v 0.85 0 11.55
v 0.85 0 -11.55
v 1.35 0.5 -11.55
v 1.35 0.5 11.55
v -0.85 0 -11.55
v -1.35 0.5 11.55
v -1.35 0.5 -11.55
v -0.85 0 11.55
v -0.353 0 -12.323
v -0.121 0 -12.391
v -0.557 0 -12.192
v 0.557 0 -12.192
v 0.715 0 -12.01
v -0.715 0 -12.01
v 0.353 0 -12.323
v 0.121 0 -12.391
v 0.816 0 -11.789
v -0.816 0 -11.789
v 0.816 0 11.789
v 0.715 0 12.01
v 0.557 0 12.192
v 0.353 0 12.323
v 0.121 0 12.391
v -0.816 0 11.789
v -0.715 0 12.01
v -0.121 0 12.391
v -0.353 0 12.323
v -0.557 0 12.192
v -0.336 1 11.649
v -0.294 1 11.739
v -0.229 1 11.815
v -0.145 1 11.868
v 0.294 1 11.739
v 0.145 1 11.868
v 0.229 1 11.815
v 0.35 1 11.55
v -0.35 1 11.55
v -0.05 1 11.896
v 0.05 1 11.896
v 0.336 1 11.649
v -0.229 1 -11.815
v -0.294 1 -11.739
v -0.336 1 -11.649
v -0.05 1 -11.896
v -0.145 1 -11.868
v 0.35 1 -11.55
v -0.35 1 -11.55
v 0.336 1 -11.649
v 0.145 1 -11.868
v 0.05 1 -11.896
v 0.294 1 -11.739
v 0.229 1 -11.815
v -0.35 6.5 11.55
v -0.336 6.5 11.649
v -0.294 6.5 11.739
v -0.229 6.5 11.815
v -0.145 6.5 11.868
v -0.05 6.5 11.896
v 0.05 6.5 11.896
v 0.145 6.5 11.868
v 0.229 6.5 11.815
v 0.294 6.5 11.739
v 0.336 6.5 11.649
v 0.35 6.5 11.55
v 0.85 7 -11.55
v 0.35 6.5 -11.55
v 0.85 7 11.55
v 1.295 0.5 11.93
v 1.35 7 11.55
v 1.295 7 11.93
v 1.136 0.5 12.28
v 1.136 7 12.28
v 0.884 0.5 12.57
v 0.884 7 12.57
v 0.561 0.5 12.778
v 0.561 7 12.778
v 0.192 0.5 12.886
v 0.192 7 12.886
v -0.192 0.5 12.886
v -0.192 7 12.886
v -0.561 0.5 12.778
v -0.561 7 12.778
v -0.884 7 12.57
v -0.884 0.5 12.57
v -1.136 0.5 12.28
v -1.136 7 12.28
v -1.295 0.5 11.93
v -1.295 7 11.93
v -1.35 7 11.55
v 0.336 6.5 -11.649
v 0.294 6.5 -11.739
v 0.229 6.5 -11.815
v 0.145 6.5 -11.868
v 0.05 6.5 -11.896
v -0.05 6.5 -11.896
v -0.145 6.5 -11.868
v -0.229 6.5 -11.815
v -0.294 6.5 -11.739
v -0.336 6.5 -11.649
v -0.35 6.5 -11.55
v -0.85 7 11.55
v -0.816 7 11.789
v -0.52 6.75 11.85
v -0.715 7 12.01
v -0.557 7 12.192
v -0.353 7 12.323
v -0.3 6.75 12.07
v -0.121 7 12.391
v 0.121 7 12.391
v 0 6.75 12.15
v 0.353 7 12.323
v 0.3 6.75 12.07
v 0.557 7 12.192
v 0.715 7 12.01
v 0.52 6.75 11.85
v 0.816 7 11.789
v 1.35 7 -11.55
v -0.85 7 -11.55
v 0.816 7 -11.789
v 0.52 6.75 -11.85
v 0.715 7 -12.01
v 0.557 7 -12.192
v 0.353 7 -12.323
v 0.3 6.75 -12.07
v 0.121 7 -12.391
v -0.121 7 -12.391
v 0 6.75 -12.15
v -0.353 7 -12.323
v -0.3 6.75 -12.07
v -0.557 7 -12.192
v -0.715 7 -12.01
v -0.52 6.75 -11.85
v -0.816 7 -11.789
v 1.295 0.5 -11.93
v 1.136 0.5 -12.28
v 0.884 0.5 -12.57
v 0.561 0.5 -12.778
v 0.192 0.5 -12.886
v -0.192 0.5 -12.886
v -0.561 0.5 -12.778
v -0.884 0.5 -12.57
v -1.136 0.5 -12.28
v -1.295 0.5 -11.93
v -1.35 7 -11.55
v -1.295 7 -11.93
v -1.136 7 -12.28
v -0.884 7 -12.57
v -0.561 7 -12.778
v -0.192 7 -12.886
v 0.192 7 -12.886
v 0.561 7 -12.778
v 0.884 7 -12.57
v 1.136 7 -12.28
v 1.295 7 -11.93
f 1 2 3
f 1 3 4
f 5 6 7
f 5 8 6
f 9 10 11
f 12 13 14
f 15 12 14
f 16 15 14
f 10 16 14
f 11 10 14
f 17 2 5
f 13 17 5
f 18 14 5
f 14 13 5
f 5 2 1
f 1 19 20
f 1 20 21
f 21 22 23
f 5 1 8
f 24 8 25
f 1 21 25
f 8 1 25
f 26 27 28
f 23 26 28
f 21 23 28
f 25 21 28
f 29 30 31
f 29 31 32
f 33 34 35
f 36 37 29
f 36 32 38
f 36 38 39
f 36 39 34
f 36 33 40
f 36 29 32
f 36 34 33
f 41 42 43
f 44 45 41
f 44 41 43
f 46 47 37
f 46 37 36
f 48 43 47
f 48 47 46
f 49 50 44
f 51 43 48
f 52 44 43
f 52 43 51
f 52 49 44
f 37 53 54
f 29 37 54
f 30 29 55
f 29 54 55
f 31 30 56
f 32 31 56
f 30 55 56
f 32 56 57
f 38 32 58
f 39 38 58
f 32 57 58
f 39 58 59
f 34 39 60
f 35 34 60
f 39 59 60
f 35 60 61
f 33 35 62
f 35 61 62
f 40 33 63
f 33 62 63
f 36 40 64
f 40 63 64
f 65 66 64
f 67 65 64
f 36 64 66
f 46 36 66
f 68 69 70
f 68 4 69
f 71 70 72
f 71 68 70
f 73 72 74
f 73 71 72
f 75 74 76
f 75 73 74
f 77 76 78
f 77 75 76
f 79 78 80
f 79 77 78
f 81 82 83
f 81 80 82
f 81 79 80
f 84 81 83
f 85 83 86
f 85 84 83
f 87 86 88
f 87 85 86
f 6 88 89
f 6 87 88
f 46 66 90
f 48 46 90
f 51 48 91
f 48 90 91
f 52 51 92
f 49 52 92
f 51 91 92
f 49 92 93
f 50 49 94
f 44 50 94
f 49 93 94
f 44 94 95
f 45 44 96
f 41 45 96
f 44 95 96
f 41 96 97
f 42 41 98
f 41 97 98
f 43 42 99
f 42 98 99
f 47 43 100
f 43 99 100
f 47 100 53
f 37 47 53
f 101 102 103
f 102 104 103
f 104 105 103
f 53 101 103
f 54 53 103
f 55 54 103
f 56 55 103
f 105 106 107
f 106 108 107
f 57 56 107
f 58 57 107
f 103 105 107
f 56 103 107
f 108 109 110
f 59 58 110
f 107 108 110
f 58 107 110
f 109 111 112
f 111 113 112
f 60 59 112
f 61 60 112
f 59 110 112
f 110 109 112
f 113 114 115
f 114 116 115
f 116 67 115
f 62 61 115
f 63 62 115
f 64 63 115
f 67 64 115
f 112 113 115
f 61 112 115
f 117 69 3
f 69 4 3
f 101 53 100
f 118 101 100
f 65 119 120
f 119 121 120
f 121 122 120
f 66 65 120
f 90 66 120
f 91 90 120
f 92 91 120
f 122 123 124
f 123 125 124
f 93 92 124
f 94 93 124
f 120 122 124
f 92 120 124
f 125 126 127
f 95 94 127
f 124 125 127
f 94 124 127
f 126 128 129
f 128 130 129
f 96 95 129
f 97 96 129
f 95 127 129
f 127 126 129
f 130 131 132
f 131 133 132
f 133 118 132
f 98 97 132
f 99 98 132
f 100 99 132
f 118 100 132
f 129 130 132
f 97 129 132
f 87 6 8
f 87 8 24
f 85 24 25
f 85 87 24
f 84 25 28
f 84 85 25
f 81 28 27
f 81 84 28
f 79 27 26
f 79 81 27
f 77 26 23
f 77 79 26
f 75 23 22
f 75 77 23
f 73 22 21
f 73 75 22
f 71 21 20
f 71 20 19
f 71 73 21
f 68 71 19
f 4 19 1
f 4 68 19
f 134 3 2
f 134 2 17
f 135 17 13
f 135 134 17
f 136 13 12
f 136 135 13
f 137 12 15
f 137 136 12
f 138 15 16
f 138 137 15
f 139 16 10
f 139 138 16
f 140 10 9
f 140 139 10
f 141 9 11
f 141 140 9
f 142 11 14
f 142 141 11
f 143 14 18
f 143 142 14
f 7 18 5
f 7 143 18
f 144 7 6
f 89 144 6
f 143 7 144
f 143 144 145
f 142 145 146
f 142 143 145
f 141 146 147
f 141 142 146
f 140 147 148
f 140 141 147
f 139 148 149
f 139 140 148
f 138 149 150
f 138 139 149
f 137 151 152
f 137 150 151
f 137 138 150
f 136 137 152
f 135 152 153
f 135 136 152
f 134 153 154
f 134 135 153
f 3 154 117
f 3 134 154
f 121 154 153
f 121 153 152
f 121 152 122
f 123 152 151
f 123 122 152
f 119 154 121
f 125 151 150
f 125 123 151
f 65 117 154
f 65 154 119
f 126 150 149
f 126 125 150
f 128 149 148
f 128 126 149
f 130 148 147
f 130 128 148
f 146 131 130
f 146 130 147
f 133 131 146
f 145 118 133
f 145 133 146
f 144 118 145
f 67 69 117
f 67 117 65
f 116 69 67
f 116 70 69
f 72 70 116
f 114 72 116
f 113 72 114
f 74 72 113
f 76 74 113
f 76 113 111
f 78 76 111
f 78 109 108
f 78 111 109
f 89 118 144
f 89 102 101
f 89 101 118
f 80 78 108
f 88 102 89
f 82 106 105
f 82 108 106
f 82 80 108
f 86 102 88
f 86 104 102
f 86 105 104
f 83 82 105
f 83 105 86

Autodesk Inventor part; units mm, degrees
ref_plane "YZ Plane" through (0, 0, 0) normal (1, 0, 0) x (0, 1, 0)
ref_plane "XZ Plane" through (0, 0, 0) normal (0, 1, 0) x (-1, 0, 0)
ref_plane "XY Plane" through (0, 0, 0) normal (0, 0, 1) x (1, 0, 0)
sketch "Sketch1" plane through (0, 0, 0) normal (0, 1, 0) x (-1, 0, 0)
  line L0 (-1.35, 11.55) -> (-1.35, -11.55)
  line L1 (1.35, -11.55) -> (1.35, 11.55)
  arc A0 (1.35, 11.55) -> (-1.35, 11.55) centre (0, 11.55) ccw
  arc A1 (-1.35, -11.55) -> (1.35, -11.55) centre (0, -11.55) ccw
  line L2 (0, 12.9) -> (0, -12.9) construction
  point P0 (0, 0)
  point P1 (0, 0)
  dimension "d0" = 2.7
  dimension "d2" = 25.8
extrude "Extrusion1" add sketch "Sketch1" along normal blind 7
sketch "Sketch2" plane through (0, 7, 0) normal (0, 1, 0) x (1, 0, 0)
  line L0 (0.35, -11.55) -> (0.35, 11.55)
  line L1 (-0.35, 11.55) -> (-0.35, -11.55)
  arc A0 (-0.35, -11.55) -> (0.35, -11.55) centre (0, -11.55) ccw
  arc A1 (0.35, 11.55) -> (-0.35, 11.55) centre (0, 11.55) ccw
  line L2 (0, -11.9) -> (0, 11.9) construction
  point P0 (0, 0)
  point P1 (0, 0)
  dimension "d5" = 23.8
  dimension "d6" = 0.7
extrude "Extrusion2" cut sketch "Sketch2" against normal blind 6
chamfer "Chamfer1" distance 0.5 angle 45 4 edges at (1.35, 0, 0) (0, 0, -12.9) (-1.35, 0, 0) (0, 0, 12.9)
chamfer "Chamfer2" distance 0.5 angle 45 4 edges at (-0.35, 7, 0) (0, 7, -11.9) (0.35, 7, 0) (0, 7, 11.9)
equation "\"d5\" = pinlength"
equation "\"d6\" = pinwidth"
equation "\"d7\" = pinheight"
equation "\"pinwidth\" = 0.7"
equation "\"pinheight\" = 6"
equation "\"pinlength\" = 23.8"
properties part number "pin_header_protector"
